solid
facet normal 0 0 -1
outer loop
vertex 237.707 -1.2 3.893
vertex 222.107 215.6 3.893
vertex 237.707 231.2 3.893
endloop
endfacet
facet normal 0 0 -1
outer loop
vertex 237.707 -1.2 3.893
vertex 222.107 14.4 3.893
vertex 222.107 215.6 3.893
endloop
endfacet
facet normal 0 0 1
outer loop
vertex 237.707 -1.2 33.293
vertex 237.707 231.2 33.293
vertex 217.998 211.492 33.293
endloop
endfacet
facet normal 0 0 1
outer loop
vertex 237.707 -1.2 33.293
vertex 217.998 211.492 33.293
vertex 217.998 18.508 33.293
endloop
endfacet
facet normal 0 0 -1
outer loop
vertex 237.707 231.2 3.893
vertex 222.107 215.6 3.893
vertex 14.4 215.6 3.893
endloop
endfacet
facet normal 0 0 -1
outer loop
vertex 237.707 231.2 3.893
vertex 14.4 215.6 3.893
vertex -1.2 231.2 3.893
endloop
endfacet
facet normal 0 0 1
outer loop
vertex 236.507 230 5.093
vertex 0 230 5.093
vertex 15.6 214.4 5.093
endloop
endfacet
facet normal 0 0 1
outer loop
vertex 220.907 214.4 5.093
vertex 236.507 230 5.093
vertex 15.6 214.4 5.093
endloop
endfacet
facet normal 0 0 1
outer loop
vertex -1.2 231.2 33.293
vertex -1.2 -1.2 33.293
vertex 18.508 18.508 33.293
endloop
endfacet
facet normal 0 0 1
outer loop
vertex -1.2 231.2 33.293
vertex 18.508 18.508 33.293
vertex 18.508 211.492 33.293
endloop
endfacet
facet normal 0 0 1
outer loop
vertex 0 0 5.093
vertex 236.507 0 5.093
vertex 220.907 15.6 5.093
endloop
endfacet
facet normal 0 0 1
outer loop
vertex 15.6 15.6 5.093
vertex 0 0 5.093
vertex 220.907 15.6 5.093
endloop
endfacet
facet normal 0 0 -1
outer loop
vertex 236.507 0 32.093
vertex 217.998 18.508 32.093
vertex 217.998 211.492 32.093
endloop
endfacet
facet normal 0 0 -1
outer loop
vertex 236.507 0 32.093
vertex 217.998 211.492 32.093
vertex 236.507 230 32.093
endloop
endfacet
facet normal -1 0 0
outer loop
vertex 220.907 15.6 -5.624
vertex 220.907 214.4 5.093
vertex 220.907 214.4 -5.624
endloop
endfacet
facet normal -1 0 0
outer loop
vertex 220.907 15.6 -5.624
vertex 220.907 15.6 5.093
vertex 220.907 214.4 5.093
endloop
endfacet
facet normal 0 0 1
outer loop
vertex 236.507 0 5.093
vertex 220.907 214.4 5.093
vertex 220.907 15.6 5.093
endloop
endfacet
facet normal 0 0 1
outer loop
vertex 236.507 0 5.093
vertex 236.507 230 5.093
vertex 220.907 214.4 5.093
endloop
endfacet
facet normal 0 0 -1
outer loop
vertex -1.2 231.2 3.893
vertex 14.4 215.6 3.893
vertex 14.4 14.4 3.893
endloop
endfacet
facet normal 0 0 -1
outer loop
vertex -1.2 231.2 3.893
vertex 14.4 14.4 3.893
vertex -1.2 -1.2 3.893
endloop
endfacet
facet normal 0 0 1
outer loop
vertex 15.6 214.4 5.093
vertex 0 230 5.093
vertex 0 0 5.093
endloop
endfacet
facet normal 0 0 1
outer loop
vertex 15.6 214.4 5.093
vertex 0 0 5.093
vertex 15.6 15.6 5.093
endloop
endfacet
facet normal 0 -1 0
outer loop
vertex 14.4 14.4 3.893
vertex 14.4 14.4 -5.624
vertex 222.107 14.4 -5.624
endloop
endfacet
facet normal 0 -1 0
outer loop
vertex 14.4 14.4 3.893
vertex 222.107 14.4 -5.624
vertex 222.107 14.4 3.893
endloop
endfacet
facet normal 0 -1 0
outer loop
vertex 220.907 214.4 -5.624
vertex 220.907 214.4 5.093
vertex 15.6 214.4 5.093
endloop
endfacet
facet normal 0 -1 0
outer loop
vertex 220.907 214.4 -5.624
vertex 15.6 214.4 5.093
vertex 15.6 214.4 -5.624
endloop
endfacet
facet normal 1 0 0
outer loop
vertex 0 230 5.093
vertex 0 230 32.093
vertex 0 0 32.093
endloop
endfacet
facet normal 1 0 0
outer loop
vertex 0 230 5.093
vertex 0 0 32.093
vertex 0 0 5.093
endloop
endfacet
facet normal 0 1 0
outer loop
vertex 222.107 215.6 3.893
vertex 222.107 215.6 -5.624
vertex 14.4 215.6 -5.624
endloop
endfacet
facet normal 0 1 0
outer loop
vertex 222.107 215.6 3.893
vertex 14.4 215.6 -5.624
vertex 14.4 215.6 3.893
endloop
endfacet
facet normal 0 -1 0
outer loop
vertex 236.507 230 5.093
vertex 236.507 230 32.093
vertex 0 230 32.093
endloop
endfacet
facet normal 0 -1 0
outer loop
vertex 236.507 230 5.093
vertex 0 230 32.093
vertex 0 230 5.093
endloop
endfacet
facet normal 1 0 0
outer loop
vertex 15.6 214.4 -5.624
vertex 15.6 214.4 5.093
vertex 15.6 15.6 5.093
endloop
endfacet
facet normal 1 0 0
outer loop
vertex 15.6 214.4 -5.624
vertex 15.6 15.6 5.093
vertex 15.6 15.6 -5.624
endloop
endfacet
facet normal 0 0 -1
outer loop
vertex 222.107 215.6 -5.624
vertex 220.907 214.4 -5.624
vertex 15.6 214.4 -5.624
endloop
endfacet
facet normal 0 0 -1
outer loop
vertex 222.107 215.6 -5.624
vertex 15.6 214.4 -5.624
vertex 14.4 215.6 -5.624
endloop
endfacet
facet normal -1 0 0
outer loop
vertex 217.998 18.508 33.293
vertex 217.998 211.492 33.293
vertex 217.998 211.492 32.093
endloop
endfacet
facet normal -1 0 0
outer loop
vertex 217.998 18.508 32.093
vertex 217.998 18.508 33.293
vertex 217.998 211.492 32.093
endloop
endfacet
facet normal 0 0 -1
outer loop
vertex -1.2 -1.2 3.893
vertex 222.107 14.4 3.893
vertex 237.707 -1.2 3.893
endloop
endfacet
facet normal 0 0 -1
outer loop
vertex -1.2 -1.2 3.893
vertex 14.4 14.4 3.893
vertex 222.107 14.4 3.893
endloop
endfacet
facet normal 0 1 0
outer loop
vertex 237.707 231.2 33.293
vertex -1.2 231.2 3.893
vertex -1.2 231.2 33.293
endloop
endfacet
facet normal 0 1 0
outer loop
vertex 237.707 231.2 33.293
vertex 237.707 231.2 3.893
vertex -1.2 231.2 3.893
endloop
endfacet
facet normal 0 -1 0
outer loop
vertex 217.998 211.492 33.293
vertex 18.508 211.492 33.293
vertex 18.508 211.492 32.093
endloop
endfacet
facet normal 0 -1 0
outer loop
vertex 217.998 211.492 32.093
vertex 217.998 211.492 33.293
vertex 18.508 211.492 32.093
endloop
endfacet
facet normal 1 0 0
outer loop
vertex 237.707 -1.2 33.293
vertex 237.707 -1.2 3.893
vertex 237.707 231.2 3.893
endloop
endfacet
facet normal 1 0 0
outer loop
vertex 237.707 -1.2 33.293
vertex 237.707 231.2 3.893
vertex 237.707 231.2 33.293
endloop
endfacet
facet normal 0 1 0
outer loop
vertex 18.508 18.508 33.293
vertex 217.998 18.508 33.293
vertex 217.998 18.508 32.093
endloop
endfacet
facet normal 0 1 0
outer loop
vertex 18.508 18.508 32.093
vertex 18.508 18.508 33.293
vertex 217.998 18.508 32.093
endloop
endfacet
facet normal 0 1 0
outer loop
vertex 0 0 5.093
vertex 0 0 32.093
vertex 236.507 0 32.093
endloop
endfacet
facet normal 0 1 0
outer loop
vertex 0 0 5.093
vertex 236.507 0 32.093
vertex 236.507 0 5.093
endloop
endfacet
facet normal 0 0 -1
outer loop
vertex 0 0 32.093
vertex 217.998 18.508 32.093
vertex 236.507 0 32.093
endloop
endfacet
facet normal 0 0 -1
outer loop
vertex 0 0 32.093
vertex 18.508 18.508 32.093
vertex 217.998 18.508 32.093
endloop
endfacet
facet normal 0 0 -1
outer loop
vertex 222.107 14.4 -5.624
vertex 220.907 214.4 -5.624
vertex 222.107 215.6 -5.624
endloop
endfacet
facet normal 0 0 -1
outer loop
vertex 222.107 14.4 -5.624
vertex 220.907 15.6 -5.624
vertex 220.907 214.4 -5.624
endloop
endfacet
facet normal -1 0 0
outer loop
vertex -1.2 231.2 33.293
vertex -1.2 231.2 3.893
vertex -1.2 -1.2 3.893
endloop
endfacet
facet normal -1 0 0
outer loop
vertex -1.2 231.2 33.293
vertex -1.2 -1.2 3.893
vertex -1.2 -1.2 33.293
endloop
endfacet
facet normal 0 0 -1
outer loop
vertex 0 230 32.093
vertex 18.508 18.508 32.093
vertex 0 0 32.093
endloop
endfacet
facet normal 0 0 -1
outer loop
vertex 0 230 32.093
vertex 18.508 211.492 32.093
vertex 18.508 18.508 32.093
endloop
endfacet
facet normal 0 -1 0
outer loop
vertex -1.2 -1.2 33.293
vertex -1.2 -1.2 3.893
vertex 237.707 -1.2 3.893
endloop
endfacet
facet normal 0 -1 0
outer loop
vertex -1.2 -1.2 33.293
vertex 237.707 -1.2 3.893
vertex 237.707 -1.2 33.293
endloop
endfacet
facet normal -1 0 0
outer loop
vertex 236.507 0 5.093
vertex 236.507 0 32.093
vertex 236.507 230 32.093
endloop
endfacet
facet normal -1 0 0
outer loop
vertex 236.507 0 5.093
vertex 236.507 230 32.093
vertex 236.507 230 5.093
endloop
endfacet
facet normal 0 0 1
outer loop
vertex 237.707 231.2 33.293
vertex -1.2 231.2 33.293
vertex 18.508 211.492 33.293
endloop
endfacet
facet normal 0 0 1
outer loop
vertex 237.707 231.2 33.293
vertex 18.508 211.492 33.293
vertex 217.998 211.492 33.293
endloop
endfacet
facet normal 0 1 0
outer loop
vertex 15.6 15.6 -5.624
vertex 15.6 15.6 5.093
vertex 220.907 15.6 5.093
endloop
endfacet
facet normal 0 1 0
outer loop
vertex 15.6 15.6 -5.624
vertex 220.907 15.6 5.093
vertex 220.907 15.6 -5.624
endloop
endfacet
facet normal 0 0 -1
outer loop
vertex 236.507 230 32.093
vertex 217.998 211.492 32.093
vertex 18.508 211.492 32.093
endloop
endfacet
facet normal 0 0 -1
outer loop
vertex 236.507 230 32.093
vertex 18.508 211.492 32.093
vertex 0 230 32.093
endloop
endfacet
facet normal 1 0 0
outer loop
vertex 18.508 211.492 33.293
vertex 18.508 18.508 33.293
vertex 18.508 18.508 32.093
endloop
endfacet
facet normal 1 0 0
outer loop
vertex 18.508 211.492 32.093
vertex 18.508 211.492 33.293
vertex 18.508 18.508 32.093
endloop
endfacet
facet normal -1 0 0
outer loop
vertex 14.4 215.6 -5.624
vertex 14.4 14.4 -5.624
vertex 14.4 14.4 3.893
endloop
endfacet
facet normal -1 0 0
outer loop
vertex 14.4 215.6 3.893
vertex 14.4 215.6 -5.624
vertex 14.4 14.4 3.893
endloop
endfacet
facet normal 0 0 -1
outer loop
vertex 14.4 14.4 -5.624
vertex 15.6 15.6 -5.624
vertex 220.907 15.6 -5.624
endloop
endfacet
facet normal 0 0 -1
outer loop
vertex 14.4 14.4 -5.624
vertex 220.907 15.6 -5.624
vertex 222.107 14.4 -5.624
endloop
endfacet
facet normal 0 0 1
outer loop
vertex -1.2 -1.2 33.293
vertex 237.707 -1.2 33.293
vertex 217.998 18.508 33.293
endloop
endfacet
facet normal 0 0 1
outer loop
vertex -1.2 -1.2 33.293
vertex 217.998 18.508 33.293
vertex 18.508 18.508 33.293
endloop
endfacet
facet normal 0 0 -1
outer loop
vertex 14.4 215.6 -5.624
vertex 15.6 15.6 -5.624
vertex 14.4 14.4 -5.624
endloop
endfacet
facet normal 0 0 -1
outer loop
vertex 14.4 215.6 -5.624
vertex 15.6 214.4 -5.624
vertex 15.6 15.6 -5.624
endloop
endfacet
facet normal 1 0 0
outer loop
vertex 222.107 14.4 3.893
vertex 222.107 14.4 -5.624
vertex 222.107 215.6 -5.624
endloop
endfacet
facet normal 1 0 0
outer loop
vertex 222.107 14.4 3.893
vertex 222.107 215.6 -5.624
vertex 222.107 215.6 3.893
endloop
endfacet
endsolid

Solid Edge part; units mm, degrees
sketch "Sketch1" plane through (0, 0, 0) normal (0, 0, 1) x (1, 0, 0)
  line L0 (0, 0) -> (0, 230)
  line L1 (0, 230) -> (236.5069, 230)
  line L2 (236.5069, 230) -> (236.5069, 0)
  line L3 (236.5069, 0) -> (0, 0)
sketch "Sketch2" plane through (0, 0, 0) normal (0, -1, 0) x (1, 0, 0)
  line L0 (0, 32.0927) -> (0, 5.0927)
  line L1 (0, 5.0927) -> (15.6, 5.0927)
  line L2 (15.6, 5.0927) -> (15.6, -5.6244)
  line L3 (15.6, -5.6244) -> (14.4, -5.6244)
  line L4 (14.4, 3.8927) -> (14.4, -5.6244)
  line L5 (-1.2, 3.8927) -> (14.4, 3.8927)
  line L6 (-1.2, 33.2927) -> (-1.2, 3.8927)
  line L7 (18.5085, 33.2927) -> (-1.2, 33.2927)
  line L8 (18.5085, 33.2927) -> (18.5085, 32.0927)
  line L9 (18.5085, 32.0927) -> (0, 32.0927)
  dimension "D1" = 1.2
sweep "ProtrusioneScorrimento_1" add profiles "Sketch2" path "Sketch1"
